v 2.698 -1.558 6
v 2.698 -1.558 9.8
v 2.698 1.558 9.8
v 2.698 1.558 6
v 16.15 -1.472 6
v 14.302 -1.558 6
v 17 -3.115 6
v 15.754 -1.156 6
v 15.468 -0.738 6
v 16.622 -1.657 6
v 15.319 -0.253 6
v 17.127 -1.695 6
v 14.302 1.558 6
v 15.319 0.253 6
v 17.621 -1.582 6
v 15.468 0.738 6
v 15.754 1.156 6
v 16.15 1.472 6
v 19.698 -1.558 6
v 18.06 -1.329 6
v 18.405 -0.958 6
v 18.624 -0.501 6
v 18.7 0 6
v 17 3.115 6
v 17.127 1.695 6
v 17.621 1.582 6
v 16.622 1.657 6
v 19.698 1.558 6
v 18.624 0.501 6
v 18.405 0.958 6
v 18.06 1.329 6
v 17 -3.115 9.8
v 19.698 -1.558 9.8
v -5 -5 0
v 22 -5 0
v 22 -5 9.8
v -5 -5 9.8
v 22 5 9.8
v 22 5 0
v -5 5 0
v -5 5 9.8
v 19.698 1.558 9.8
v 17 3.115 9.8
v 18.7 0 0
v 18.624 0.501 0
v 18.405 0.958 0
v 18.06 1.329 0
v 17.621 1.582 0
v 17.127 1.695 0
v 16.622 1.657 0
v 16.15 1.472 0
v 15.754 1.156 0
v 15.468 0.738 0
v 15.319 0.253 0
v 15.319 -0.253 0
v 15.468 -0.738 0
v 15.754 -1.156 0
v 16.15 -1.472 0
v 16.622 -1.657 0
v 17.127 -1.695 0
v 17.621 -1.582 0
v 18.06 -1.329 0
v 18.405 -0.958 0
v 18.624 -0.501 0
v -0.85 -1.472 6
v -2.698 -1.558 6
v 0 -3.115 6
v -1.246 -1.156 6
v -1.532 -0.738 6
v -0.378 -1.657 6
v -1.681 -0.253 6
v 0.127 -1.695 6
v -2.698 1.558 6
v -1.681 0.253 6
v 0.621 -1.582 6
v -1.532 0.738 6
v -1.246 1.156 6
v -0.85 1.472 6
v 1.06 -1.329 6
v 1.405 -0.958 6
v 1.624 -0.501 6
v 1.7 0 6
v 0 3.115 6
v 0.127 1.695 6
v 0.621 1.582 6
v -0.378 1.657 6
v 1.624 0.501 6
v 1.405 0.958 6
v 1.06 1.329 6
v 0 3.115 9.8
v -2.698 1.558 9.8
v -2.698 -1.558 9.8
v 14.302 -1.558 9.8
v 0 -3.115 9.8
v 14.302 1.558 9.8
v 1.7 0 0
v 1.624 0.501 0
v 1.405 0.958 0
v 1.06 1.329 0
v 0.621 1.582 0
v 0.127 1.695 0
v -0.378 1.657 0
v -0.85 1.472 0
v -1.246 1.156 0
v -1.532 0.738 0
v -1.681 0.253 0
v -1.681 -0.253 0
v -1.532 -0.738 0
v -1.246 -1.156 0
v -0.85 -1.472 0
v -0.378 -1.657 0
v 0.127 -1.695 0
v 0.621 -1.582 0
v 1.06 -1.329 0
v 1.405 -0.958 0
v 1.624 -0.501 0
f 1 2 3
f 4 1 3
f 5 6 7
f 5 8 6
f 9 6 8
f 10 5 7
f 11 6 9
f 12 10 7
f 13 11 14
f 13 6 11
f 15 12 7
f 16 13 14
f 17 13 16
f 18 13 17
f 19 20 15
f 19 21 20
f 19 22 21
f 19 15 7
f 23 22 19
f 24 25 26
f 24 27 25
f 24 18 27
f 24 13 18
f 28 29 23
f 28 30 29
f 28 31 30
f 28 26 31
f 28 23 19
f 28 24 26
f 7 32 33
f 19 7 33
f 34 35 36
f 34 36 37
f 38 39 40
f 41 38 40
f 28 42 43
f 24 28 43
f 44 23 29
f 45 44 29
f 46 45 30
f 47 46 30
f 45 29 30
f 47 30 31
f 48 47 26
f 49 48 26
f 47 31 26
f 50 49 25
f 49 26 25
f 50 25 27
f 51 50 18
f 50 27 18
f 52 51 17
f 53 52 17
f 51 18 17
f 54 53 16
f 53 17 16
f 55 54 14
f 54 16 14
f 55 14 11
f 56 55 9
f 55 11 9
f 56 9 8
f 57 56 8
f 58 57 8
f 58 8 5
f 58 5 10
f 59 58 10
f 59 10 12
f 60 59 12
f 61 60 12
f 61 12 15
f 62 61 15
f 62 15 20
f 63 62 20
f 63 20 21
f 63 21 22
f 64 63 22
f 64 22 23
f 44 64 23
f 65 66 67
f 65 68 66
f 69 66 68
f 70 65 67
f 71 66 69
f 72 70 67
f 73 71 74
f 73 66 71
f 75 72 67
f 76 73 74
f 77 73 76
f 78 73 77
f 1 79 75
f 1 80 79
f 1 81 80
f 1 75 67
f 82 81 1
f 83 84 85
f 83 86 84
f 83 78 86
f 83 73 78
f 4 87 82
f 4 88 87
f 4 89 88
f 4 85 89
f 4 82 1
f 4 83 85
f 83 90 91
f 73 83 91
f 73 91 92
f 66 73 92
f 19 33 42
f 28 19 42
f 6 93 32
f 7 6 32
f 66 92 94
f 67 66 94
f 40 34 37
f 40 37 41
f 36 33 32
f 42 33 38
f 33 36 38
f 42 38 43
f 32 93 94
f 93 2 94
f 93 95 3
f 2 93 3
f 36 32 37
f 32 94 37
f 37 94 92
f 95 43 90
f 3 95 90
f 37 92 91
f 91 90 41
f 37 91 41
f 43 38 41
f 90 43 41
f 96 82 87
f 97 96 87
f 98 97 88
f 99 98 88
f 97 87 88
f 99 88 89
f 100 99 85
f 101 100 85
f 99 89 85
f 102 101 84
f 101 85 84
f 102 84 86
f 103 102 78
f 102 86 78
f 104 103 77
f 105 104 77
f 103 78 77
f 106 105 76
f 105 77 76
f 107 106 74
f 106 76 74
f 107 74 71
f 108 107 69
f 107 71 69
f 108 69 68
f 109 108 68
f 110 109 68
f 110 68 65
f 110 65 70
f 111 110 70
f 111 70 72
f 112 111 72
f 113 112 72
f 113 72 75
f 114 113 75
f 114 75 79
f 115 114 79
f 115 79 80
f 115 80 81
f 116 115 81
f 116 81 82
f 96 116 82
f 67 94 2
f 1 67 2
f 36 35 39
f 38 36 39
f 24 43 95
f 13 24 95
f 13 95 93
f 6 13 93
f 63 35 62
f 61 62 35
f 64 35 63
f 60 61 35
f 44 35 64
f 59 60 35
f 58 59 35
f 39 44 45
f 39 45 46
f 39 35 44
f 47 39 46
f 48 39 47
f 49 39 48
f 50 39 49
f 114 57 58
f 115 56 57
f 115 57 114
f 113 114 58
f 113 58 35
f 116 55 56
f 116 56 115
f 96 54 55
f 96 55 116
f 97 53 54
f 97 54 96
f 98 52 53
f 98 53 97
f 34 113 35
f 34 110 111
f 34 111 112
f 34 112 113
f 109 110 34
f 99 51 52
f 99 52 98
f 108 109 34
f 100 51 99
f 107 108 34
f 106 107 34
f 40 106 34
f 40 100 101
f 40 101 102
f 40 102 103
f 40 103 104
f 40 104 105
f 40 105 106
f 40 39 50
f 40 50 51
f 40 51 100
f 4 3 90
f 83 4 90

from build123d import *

# Parameters (mm, degrees)
SKETCH1_W           = 27
SKETCH1_H           = 10
BOSS_EXTRUDE1_DEPTH = 9.8
CUT_EXTRUDE1_DEPTH  = 3.8
CUT_EXTRUDE2_DEPTH  = 3.8
HOLE1_D             = 3.4
HOLE1_DEPTH         = 9.8
HOLE2_D             = 3.4
HOLE2_DEPTH         = 9.8


with BuildPart() as part:
    # Sketch1 → Boss-Extrude1 (new body)
    with BuildSketch(Plane(origin=(0, 0, 0), x_dir=(-1, 0, 0), z_dir=(0, 0, -1))):
        with Locations((-8.5, 0)):
            Rectangle(SKETCH1_W, SKETCH1_H)
    extrude(amount=-BOSS_EXTRUDE1_DEPTH)

    # Sketch2 → Cut-Extrude1 (cut)
    with BuildSketch(Plane.XY.offset(9.8)):
        Polygon((-2.698076211, -1.557735027), (0, -3.115470054), (2.698076211, -1.557735027), (2.698076211, 1.557735027), (0, 3.115470054), (-2.698076211, 1.557735027), align=None)
    extrude(amount=-CUT_EXTRUDE1_DEPTH, mode=Mode.SUBTRACT)

    # Sketch3 → Cut-Extrude2 (cut)
    with BuildSketch(Plane.XY.offset(9.8)):
        Polygon((14.301923789, -1.557735027), (17, -3.115470054), (19.698076211, -1.557735027), (19.698076211, 1.557735027), (17, 3.115470054), (14.301923789, 1.557735027), align=None)
    extrude(amount=-CUT_EXTRUDE2_DEPTH, mode=Mode.SUBTRACT)

    # Hole1
    with Locations(Plane(origin=(0, 0, 0), x_dir=(-1, 0, 0), z_dir=(0, 0, -1))):
        with Locations((0, 0)):
            Hole(HOLE1_D / 2, depth=HOLE1_DEPTH)

    # Hole2
    with Locations(Plane(origin=(0, 0, 0), x_dir=(-1, 0, 0), z_dir=(0, 0, -1))):
        with Locations((-17, 0)):
            Hole(HOLE2_D / 2, depth=HOLE2_DEPTH)


solid = part.part
